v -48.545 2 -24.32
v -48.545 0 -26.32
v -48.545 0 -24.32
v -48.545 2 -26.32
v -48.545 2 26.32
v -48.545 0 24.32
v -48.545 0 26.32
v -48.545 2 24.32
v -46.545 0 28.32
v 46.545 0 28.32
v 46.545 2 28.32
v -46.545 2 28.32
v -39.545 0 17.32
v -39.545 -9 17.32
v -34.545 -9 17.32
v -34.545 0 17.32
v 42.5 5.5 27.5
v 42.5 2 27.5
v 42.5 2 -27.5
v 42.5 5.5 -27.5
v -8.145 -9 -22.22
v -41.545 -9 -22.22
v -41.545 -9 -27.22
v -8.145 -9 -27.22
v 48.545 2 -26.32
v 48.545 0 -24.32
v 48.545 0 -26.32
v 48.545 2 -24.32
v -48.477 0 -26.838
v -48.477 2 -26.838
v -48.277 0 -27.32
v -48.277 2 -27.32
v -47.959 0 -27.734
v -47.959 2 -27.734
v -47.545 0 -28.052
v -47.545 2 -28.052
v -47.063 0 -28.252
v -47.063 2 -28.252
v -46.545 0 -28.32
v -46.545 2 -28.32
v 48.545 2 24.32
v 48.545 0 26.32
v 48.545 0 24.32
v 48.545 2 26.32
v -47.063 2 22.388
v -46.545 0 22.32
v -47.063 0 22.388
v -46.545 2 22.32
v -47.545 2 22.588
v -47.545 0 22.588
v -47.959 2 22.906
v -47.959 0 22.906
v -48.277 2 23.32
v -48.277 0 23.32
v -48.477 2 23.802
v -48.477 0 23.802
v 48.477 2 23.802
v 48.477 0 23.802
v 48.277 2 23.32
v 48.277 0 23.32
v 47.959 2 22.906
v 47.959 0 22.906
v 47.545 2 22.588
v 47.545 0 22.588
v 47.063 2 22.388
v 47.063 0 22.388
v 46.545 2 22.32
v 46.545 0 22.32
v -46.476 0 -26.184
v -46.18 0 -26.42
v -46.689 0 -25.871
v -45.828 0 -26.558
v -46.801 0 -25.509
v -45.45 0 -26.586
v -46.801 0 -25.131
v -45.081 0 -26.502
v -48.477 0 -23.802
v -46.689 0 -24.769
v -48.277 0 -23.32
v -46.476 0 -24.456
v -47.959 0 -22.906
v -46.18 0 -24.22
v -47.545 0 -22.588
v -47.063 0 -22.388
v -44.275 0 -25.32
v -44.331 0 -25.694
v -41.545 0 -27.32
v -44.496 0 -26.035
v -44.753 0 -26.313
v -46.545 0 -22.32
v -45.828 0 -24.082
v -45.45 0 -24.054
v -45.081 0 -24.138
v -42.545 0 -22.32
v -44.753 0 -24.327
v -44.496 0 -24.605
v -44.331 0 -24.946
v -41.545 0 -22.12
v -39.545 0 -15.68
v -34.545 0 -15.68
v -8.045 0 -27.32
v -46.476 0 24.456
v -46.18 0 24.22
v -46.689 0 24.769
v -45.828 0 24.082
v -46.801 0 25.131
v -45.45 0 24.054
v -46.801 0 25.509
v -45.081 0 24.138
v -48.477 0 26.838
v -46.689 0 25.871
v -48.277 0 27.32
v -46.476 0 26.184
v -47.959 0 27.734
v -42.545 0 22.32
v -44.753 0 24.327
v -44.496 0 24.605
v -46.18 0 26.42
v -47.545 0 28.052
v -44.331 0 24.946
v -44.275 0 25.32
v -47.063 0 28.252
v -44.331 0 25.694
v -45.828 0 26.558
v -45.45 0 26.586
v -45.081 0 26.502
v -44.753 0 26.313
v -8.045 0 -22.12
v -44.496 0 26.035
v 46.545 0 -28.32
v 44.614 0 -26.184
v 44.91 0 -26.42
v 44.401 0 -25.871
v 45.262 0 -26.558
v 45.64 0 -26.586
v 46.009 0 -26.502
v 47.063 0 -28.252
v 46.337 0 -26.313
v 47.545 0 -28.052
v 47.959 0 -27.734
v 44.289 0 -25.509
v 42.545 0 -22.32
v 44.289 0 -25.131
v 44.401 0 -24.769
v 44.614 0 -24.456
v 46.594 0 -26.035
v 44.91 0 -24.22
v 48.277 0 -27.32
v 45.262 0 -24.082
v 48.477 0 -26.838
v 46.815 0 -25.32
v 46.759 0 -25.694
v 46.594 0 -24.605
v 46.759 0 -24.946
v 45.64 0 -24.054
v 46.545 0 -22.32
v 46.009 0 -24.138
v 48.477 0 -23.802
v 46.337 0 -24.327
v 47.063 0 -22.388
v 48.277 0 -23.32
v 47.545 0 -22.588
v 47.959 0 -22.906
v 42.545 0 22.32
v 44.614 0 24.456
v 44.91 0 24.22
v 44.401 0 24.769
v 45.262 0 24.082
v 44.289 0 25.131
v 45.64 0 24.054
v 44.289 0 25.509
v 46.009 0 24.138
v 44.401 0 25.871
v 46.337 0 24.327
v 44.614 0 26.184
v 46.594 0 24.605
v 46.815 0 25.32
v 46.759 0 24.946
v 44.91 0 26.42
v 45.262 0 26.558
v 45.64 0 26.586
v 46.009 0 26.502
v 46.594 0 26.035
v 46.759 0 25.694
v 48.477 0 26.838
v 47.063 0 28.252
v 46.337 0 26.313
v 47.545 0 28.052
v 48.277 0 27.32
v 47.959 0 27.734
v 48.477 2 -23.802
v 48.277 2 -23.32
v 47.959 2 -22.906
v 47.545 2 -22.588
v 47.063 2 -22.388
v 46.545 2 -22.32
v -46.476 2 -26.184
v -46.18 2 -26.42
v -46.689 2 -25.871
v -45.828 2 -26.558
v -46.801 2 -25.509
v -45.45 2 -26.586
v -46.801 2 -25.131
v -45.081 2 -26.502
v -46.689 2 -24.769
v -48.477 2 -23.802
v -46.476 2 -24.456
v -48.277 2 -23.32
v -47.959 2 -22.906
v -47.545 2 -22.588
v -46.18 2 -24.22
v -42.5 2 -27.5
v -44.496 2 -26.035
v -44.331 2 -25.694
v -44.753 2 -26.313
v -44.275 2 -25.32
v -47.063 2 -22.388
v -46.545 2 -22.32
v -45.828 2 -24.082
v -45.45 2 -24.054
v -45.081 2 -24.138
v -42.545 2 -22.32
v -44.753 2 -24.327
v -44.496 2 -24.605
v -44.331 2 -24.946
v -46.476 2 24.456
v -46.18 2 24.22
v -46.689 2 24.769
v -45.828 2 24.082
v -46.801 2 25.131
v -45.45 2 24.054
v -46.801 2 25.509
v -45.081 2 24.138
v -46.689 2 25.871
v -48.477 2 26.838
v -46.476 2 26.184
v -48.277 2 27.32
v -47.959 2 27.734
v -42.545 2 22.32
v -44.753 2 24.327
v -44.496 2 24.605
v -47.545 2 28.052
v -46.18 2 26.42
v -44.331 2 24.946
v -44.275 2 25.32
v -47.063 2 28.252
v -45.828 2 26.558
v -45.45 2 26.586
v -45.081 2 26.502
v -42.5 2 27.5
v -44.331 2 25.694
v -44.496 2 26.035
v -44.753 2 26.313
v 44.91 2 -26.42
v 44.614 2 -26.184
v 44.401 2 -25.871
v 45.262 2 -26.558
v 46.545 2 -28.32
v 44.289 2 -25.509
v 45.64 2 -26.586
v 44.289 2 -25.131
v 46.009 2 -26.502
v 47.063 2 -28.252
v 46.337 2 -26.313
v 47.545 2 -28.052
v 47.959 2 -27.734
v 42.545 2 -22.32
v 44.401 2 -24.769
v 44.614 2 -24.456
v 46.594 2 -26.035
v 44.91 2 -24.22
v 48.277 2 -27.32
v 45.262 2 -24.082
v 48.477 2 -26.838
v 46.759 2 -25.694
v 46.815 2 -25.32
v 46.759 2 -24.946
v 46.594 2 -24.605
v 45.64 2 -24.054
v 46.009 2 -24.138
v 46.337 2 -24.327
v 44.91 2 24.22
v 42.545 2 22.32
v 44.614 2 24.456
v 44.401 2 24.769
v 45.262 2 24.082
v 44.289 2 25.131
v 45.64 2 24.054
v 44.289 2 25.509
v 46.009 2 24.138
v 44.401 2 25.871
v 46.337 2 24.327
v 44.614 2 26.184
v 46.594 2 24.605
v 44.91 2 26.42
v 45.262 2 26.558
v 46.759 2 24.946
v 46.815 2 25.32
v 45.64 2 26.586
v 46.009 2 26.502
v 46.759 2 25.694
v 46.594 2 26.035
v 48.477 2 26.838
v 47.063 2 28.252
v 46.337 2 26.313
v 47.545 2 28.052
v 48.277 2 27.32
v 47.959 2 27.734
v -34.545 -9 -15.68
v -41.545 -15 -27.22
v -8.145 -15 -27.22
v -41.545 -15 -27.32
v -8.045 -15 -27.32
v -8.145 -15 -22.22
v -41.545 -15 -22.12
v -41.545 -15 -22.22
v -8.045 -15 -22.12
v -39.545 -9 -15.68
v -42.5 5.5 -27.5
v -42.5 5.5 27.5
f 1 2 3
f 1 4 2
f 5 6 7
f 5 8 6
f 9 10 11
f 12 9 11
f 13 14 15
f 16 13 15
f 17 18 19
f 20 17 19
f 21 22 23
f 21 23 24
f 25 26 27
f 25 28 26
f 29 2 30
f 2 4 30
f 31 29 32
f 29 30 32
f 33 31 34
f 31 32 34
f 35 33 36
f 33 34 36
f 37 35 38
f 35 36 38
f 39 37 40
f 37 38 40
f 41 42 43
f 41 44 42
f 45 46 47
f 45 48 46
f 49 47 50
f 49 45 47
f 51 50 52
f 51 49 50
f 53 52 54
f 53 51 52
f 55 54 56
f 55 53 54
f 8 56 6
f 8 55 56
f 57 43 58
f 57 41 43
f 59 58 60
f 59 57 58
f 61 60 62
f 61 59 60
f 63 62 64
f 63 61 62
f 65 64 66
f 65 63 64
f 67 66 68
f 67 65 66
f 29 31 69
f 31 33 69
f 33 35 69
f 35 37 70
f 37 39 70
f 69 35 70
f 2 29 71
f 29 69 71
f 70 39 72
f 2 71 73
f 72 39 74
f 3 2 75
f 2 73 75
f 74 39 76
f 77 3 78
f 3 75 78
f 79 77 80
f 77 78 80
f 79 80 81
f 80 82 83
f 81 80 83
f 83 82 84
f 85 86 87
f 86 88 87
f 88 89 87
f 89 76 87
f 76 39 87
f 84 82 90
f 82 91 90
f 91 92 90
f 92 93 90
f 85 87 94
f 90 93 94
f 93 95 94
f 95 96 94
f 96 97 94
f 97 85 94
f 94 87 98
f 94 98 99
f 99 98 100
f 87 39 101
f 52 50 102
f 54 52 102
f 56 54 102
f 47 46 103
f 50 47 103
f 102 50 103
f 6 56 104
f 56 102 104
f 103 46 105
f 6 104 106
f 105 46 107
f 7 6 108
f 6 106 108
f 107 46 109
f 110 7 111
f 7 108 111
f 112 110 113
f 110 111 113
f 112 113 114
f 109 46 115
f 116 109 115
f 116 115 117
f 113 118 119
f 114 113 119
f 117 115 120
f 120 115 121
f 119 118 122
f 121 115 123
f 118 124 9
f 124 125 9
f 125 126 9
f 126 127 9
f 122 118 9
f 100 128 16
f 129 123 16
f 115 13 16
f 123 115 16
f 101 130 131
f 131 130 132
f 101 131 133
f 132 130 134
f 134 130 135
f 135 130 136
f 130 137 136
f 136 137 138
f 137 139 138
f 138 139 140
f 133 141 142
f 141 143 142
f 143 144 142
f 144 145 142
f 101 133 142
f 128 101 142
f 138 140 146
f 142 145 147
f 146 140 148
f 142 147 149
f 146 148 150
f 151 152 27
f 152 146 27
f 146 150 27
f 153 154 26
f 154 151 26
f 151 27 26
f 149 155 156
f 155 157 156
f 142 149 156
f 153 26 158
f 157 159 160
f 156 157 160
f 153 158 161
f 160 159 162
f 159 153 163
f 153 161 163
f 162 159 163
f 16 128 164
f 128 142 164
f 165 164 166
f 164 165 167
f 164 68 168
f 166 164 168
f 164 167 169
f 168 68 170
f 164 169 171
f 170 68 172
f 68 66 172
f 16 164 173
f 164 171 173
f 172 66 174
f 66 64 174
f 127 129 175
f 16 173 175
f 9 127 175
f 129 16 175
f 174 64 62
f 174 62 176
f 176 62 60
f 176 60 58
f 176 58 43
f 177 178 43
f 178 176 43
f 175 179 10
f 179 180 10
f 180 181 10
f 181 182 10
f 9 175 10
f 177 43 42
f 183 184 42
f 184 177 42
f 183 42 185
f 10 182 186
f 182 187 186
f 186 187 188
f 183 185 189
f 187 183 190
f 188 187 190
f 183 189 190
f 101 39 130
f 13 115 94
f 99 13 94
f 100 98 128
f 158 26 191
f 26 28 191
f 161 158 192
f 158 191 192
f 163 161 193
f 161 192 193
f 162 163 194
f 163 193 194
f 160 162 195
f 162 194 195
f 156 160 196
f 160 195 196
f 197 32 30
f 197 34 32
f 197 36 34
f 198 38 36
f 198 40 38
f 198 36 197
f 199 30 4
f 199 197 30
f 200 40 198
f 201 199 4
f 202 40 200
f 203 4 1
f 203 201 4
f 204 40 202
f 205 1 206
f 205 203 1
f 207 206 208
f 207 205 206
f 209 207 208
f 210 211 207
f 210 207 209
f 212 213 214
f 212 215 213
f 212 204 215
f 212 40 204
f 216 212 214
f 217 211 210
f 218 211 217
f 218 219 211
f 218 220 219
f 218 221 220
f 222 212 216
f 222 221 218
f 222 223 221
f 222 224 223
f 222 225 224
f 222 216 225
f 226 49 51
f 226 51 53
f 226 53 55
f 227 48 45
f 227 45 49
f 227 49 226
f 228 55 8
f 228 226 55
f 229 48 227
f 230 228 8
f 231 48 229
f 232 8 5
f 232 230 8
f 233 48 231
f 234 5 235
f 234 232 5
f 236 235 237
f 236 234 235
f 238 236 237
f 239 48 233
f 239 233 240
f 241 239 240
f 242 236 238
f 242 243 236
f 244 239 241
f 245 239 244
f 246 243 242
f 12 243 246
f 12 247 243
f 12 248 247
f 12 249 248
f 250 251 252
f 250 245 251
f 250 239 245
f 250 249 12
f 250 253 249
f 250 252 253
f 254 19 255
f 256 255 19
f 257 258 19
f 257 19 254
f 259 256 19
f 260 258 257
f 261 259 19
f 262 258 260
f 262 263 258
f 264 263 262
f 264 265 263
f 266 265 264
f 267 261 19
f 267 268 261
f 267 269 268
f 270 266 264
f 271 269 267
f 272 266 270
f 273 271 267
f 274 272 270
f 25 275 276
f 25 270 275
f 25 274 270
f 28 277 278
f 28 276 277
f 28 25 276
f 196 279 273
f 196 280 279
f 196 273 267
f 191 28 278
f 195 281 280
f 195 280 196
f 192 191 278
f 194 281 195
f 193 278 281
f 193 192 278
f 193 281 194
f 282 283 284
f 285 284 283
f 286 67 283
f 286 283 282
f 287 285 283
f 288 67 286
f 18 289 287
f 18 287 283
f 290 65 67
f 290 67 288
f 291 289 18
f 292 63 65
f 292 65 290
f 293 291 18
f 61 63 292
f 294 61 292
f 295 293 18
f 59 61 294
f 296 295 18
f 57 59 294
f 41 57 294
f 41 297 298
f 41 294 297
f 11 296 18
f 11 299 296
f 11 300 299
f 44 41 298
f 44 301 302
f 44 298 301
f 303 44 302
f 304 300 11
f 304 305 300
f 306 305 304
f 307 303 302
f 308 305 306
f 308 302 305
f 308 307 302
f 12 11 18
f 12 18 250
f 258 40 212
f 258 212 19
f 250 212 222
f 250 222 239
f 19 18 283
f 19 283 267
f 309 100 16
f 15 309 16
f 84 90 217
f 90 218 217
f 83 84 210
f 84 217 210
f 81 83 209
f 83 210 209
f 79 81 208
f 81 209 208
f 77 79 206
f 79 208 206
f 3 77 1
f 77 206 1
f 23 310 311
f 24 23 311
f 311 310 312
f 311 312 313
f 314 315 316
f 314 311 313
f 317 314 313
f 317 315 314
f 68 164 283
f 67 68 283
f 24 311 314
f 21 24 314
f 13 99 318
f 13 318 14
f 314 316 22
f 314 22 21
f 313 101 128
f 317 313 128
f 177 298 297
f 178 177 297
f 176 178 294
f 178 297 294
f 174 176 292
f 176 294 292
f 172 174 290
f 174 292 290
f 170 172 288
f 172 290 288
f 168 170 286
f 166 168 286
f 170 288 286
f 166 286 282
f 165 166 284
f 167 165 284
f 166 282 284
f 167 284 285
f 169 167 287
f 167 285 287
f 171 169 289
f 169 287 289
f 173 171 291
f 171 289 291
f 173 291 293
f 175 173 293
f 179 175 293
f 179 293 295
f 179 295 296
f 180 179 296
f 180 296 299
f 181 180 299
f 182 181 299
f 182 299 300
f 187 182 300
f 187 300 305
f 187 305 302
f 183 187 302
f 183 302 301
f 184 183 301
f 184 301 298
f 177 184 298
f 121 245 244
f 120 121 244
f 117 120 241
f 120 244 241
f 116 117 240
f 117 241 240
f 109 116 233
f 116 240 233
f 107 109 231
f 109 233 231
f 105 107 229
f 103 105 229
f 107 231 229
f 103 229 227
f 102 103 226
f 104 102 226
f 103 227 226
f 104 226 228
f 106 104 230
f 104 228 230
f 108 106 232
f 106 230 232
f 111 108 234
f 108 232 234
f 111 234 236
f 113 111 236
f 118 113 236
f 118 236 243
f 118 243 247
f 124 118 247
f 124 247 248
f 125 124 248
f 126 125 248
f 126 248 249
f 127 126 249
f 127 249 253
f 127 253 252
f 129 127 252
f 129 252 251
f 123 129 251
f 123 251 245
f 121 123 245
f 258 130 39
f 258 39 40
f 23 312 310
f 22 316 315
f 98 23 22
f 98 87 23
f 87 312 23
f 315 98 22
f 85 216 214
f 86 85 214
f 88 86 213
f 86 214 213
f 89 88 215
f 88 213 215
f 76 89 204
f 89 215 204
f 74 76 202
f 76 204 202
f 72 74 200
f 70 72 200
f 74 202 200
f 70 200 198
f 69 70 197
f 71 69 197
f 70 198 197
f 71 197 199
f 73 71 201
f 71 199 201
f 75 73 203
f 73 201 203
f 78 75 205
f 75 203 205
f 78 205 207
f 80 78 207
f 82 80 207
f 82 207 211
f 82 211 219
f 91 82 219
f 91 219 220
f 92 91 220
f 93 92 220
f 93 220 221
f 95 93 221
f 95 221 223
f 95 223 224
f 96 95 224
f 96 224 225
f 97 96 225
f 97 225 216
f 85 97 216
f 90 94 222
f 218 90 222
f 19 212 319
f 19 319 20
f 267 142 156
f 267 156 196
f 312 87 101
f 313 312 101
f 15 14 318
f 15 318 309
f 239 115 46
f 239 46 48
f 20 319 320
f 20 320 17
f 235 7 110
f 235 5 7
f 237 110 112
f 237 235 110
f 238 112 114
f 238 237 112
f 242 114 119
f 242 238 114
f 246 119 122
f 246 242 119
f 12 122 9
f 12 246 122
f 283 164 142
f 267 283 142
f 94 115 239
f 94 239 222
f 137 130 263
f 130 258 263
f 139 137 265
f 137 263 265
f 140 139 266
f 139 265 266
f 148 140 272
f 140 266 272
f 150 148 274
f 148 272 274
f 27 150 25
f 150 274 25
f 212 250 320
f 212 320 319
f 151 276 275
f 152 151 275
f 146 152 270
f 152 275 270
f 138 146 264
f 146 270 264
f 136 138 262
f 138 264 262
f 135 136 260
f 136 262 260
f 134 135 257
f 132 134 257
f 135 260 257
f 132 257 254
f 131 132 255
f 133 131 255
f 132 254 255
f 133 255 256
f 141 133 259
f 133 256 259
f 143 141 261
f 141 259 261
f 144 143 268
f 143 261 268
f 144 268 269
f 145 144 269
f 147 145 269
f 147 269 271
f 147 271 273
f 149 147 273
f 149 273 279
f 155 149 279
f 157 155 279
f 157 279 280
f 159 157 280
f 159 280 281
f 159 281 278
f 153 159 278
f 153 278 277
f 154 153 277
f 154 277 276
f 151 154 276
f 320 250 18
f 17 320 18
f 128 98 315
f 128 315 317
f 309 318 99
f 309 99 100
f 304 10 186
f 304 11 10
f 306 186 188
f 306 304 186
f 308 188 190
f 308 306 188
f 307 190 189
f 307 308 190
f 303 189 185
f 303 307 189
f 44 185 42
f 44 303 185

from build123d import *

# Parameters (mm, degrees)
SKETCH1_W            = 85.09
SKETCH1_H            = 56.64
BOSS_EXTRUDE1_DEPTH  = 2
SKETCH3_W            = 6
SKETCH3_H            = 2
BOSS_EXTRUDE4_DEPTH  = 6
SKETCH4_R            = 1.27
CUT_EXTRUDE3_DEPTH   = 6
SKETCH5_W            = 6
SKETCH5_H            = 2
BOSS_EXTRUDE5_DEPTH  = 6
SKETCH7_R            = 1.27
CUT_EXTRUDE4_DEPTH   = 6
SKETCH8_W            = 6
SKETCH8_H            = 2
BOSS_EXTRUDE6_DEPTH  = 6
SKETCH9_W            = 6
SKETCH9_H            = 2
BOSS_EXTRUDE7_DEPTH  = 6
SKETCH10_R           = 1.27
CUT_EXTRUDE5_DEPTH   = 6
SKETCH11_R           = 1.27
CUT_EXTRUDE6_DEPTH   = 6
FILLET5_R            = 2
SKETCH12_W           = 33.5
SKETCH12_H           = 5.2
BOSS_EXTRUDE8_DEPTH  = 15
SKETCH14_W           = 33.4
SKETCH14_H           = 5
CUT_EXTRUDE9_DEPTH   = 6
SKETCH15_W           = 5
SKETCH15_H           = 33
BOSS_EXTRUDE9_DEPTH  = 9
SKETCH16_W           = 85
SKETCH16_H           = 55
BOSS_EXTRUDE10_DEPTH = 3.5


with BuildPart() as part:
    # Sketch1 → Boss-Extrude1 (new body)
    with BuildSketch(Plane(origin=(0, 0, 0), x_dir=(1, 0, 0), z_dir=(0, 1, 0))):
        Rectangle(SKETCH1_W, SKETCH1_H)
    extrude(amount=BOSS_EXTRUDE1_DEPTH)

    # Sketch3 → Boss-Extrude4 (add)
    with BuildSketch(Plane(origin=(42.545, 0, 0), x_dir=(0, 0, -1), z_dir=(1, 0, 0))):
        with Locations((-25.32, 1)):
            Rectangle(SKETCH3_W, SKETCH3_H)
    extrude(amount=BOSS_EXTRUDE4_DEPTH)

    # Sketch4 → Cut-Extrude3 (cut)
    with BuildSketch(Plane(origin=(0, 2, 0), x_dir=(1, 0, 0), z_dir=(0, 1, 0))):
        with Locations((45.545, -25.32)):
            Circle(SKETCH4_R)
    extrude(amount=-CUT_EXTRUDE3_DEPTH, mode=Mode.SUBTRACT)

    # Sketch5 → Boss-Extrude5 (add)
    with BuildSketch(Plane(origin=(42.545, 0, 0), x_dir=(0, 0, -1), z_dir=(1, 0, 0))):
        with Locations((25.32, 1)):
            Rectangle(SKETCH5_W, SKETCH5_H)
    extrude(amount=BOSS_EXTRUDE5_DEPTH)

    # Sketch7 → Cut-Extrude4 (cut)
    with BuildSketch(Plane(origin=(0, 2, 0), x_dir=(1, 0, 0), z_dir=(0, 1, 0))):
        with Locations((45.545, 25.32)):
            Circle(SKETCH7_R)
    extrude(amount=-CUT_EXTRUDE4_DEPTH, mode=Mode.SUBTRACT)

    # Sketch8 → Boss-Extrude6 (add)
    with BuildSketch(Plane.ZY.offset(42.545)):
        with Locations((-25.32, 1)):
            Rectangle(SKETCH8_W, SKETCH8_H)
    extrude(amount=BOSS_EXTRUDE6_DEPTH)

    # Sketch9 → Boss-Extrude7 (add)
    with BuildSketch(Plane.ZY.offset(42.545)):
        with Locations((25.32, 1)):
            Rectangle(SKETCH9_W, SKETCH9_H)
    extrude(amount=BOSS_EXTRUDE7_DEPTH)

    # Sketch10 → Cut-Extrude5 (cut)
    with BuildSketch(Plane(origin=(0, 2, 0), x_dir=(1, 0, 0), z_dir=(0, 1, 0))):
        with Locations((-45.545, 25.32)):
            Circle(SKETCH10_R)
    extrude(amount=-CUT_EXTRUDE5_DEPTH, mode=Mode.SUBTRACT)

    # Sketch11 → Cut-Extrude6 (cut)
    with BuildSketch(Plane(origin=(0, 2, 0), x_dir=(1, 0, 0), z_dir=(0, 1, 0))):
        with Locations((-45.545, -25.32)):
            Circle(SKETCH11_R)
    extrude(amount=-CUT_EXTRUDE6_DEPTH, mode=Mode.SUBTRACT)

    # Fillet5
    fillet5_edges = [part.edges().sort_by_distance(p)[0] for p in [
        (48.545, 1, 28.32),
        (48.545, 1, 22.32),
        (48.545, 1, -28.32),
        (48.545, 1, -22.32),
        (-48.545, 1, -28.32),
        (-48.545, 1, -22.32),
        (-48.545, 1, 28.32),
        (-48.545, 1, 22.32),
    ]]
    fillet(fillet5_edges, radius=FILLET5_R)

    # Sketch12 → Boss-Extrude8 (add)
    with BuildSketch(Plane.XZ):
        with Locations((-24.795, -24.72)):
            Rectangle(SKETCH12_W, SKETCH12_H)
    extrude(amount=BOSS_EXTRUDE8_DEPTH)

    # Sketch14 → Cut-Extrude9 (cut)
    with BuildSketch(Plane.XZ.offset(15)):
        with Locations((-24.845, -24.72)):
            Rectangle(SKETCH14_W, SKETCH14_H)
    extrude(amount=-CUT_EXTRUDE9_DEPTH, mode=Mode.SUBTRACT)

    # Sketch15 → Boss-Extrude9 (add)
    with BuildSketch(Plane.XZ):
        with Locations((-37.045, 0.82)):
            Rectangle(SKETCH15_W, SKETCH15_H)
    extrude(amount=BOSS_EXTRUDE9_DEPTH)

    # Sketch16 → Boss-Extrude10 (add)
    with BuildSketch(Plane(origin=(0, 2, 0), x_dir=(1, 0, 0), z_dir=(0, 1, 0))):
        Rectangle(SKETCH16_W, SKETCH16_H)
    extrude(amount=BOSS_EXTRUDE10_DEPTH)


solid = part.part
